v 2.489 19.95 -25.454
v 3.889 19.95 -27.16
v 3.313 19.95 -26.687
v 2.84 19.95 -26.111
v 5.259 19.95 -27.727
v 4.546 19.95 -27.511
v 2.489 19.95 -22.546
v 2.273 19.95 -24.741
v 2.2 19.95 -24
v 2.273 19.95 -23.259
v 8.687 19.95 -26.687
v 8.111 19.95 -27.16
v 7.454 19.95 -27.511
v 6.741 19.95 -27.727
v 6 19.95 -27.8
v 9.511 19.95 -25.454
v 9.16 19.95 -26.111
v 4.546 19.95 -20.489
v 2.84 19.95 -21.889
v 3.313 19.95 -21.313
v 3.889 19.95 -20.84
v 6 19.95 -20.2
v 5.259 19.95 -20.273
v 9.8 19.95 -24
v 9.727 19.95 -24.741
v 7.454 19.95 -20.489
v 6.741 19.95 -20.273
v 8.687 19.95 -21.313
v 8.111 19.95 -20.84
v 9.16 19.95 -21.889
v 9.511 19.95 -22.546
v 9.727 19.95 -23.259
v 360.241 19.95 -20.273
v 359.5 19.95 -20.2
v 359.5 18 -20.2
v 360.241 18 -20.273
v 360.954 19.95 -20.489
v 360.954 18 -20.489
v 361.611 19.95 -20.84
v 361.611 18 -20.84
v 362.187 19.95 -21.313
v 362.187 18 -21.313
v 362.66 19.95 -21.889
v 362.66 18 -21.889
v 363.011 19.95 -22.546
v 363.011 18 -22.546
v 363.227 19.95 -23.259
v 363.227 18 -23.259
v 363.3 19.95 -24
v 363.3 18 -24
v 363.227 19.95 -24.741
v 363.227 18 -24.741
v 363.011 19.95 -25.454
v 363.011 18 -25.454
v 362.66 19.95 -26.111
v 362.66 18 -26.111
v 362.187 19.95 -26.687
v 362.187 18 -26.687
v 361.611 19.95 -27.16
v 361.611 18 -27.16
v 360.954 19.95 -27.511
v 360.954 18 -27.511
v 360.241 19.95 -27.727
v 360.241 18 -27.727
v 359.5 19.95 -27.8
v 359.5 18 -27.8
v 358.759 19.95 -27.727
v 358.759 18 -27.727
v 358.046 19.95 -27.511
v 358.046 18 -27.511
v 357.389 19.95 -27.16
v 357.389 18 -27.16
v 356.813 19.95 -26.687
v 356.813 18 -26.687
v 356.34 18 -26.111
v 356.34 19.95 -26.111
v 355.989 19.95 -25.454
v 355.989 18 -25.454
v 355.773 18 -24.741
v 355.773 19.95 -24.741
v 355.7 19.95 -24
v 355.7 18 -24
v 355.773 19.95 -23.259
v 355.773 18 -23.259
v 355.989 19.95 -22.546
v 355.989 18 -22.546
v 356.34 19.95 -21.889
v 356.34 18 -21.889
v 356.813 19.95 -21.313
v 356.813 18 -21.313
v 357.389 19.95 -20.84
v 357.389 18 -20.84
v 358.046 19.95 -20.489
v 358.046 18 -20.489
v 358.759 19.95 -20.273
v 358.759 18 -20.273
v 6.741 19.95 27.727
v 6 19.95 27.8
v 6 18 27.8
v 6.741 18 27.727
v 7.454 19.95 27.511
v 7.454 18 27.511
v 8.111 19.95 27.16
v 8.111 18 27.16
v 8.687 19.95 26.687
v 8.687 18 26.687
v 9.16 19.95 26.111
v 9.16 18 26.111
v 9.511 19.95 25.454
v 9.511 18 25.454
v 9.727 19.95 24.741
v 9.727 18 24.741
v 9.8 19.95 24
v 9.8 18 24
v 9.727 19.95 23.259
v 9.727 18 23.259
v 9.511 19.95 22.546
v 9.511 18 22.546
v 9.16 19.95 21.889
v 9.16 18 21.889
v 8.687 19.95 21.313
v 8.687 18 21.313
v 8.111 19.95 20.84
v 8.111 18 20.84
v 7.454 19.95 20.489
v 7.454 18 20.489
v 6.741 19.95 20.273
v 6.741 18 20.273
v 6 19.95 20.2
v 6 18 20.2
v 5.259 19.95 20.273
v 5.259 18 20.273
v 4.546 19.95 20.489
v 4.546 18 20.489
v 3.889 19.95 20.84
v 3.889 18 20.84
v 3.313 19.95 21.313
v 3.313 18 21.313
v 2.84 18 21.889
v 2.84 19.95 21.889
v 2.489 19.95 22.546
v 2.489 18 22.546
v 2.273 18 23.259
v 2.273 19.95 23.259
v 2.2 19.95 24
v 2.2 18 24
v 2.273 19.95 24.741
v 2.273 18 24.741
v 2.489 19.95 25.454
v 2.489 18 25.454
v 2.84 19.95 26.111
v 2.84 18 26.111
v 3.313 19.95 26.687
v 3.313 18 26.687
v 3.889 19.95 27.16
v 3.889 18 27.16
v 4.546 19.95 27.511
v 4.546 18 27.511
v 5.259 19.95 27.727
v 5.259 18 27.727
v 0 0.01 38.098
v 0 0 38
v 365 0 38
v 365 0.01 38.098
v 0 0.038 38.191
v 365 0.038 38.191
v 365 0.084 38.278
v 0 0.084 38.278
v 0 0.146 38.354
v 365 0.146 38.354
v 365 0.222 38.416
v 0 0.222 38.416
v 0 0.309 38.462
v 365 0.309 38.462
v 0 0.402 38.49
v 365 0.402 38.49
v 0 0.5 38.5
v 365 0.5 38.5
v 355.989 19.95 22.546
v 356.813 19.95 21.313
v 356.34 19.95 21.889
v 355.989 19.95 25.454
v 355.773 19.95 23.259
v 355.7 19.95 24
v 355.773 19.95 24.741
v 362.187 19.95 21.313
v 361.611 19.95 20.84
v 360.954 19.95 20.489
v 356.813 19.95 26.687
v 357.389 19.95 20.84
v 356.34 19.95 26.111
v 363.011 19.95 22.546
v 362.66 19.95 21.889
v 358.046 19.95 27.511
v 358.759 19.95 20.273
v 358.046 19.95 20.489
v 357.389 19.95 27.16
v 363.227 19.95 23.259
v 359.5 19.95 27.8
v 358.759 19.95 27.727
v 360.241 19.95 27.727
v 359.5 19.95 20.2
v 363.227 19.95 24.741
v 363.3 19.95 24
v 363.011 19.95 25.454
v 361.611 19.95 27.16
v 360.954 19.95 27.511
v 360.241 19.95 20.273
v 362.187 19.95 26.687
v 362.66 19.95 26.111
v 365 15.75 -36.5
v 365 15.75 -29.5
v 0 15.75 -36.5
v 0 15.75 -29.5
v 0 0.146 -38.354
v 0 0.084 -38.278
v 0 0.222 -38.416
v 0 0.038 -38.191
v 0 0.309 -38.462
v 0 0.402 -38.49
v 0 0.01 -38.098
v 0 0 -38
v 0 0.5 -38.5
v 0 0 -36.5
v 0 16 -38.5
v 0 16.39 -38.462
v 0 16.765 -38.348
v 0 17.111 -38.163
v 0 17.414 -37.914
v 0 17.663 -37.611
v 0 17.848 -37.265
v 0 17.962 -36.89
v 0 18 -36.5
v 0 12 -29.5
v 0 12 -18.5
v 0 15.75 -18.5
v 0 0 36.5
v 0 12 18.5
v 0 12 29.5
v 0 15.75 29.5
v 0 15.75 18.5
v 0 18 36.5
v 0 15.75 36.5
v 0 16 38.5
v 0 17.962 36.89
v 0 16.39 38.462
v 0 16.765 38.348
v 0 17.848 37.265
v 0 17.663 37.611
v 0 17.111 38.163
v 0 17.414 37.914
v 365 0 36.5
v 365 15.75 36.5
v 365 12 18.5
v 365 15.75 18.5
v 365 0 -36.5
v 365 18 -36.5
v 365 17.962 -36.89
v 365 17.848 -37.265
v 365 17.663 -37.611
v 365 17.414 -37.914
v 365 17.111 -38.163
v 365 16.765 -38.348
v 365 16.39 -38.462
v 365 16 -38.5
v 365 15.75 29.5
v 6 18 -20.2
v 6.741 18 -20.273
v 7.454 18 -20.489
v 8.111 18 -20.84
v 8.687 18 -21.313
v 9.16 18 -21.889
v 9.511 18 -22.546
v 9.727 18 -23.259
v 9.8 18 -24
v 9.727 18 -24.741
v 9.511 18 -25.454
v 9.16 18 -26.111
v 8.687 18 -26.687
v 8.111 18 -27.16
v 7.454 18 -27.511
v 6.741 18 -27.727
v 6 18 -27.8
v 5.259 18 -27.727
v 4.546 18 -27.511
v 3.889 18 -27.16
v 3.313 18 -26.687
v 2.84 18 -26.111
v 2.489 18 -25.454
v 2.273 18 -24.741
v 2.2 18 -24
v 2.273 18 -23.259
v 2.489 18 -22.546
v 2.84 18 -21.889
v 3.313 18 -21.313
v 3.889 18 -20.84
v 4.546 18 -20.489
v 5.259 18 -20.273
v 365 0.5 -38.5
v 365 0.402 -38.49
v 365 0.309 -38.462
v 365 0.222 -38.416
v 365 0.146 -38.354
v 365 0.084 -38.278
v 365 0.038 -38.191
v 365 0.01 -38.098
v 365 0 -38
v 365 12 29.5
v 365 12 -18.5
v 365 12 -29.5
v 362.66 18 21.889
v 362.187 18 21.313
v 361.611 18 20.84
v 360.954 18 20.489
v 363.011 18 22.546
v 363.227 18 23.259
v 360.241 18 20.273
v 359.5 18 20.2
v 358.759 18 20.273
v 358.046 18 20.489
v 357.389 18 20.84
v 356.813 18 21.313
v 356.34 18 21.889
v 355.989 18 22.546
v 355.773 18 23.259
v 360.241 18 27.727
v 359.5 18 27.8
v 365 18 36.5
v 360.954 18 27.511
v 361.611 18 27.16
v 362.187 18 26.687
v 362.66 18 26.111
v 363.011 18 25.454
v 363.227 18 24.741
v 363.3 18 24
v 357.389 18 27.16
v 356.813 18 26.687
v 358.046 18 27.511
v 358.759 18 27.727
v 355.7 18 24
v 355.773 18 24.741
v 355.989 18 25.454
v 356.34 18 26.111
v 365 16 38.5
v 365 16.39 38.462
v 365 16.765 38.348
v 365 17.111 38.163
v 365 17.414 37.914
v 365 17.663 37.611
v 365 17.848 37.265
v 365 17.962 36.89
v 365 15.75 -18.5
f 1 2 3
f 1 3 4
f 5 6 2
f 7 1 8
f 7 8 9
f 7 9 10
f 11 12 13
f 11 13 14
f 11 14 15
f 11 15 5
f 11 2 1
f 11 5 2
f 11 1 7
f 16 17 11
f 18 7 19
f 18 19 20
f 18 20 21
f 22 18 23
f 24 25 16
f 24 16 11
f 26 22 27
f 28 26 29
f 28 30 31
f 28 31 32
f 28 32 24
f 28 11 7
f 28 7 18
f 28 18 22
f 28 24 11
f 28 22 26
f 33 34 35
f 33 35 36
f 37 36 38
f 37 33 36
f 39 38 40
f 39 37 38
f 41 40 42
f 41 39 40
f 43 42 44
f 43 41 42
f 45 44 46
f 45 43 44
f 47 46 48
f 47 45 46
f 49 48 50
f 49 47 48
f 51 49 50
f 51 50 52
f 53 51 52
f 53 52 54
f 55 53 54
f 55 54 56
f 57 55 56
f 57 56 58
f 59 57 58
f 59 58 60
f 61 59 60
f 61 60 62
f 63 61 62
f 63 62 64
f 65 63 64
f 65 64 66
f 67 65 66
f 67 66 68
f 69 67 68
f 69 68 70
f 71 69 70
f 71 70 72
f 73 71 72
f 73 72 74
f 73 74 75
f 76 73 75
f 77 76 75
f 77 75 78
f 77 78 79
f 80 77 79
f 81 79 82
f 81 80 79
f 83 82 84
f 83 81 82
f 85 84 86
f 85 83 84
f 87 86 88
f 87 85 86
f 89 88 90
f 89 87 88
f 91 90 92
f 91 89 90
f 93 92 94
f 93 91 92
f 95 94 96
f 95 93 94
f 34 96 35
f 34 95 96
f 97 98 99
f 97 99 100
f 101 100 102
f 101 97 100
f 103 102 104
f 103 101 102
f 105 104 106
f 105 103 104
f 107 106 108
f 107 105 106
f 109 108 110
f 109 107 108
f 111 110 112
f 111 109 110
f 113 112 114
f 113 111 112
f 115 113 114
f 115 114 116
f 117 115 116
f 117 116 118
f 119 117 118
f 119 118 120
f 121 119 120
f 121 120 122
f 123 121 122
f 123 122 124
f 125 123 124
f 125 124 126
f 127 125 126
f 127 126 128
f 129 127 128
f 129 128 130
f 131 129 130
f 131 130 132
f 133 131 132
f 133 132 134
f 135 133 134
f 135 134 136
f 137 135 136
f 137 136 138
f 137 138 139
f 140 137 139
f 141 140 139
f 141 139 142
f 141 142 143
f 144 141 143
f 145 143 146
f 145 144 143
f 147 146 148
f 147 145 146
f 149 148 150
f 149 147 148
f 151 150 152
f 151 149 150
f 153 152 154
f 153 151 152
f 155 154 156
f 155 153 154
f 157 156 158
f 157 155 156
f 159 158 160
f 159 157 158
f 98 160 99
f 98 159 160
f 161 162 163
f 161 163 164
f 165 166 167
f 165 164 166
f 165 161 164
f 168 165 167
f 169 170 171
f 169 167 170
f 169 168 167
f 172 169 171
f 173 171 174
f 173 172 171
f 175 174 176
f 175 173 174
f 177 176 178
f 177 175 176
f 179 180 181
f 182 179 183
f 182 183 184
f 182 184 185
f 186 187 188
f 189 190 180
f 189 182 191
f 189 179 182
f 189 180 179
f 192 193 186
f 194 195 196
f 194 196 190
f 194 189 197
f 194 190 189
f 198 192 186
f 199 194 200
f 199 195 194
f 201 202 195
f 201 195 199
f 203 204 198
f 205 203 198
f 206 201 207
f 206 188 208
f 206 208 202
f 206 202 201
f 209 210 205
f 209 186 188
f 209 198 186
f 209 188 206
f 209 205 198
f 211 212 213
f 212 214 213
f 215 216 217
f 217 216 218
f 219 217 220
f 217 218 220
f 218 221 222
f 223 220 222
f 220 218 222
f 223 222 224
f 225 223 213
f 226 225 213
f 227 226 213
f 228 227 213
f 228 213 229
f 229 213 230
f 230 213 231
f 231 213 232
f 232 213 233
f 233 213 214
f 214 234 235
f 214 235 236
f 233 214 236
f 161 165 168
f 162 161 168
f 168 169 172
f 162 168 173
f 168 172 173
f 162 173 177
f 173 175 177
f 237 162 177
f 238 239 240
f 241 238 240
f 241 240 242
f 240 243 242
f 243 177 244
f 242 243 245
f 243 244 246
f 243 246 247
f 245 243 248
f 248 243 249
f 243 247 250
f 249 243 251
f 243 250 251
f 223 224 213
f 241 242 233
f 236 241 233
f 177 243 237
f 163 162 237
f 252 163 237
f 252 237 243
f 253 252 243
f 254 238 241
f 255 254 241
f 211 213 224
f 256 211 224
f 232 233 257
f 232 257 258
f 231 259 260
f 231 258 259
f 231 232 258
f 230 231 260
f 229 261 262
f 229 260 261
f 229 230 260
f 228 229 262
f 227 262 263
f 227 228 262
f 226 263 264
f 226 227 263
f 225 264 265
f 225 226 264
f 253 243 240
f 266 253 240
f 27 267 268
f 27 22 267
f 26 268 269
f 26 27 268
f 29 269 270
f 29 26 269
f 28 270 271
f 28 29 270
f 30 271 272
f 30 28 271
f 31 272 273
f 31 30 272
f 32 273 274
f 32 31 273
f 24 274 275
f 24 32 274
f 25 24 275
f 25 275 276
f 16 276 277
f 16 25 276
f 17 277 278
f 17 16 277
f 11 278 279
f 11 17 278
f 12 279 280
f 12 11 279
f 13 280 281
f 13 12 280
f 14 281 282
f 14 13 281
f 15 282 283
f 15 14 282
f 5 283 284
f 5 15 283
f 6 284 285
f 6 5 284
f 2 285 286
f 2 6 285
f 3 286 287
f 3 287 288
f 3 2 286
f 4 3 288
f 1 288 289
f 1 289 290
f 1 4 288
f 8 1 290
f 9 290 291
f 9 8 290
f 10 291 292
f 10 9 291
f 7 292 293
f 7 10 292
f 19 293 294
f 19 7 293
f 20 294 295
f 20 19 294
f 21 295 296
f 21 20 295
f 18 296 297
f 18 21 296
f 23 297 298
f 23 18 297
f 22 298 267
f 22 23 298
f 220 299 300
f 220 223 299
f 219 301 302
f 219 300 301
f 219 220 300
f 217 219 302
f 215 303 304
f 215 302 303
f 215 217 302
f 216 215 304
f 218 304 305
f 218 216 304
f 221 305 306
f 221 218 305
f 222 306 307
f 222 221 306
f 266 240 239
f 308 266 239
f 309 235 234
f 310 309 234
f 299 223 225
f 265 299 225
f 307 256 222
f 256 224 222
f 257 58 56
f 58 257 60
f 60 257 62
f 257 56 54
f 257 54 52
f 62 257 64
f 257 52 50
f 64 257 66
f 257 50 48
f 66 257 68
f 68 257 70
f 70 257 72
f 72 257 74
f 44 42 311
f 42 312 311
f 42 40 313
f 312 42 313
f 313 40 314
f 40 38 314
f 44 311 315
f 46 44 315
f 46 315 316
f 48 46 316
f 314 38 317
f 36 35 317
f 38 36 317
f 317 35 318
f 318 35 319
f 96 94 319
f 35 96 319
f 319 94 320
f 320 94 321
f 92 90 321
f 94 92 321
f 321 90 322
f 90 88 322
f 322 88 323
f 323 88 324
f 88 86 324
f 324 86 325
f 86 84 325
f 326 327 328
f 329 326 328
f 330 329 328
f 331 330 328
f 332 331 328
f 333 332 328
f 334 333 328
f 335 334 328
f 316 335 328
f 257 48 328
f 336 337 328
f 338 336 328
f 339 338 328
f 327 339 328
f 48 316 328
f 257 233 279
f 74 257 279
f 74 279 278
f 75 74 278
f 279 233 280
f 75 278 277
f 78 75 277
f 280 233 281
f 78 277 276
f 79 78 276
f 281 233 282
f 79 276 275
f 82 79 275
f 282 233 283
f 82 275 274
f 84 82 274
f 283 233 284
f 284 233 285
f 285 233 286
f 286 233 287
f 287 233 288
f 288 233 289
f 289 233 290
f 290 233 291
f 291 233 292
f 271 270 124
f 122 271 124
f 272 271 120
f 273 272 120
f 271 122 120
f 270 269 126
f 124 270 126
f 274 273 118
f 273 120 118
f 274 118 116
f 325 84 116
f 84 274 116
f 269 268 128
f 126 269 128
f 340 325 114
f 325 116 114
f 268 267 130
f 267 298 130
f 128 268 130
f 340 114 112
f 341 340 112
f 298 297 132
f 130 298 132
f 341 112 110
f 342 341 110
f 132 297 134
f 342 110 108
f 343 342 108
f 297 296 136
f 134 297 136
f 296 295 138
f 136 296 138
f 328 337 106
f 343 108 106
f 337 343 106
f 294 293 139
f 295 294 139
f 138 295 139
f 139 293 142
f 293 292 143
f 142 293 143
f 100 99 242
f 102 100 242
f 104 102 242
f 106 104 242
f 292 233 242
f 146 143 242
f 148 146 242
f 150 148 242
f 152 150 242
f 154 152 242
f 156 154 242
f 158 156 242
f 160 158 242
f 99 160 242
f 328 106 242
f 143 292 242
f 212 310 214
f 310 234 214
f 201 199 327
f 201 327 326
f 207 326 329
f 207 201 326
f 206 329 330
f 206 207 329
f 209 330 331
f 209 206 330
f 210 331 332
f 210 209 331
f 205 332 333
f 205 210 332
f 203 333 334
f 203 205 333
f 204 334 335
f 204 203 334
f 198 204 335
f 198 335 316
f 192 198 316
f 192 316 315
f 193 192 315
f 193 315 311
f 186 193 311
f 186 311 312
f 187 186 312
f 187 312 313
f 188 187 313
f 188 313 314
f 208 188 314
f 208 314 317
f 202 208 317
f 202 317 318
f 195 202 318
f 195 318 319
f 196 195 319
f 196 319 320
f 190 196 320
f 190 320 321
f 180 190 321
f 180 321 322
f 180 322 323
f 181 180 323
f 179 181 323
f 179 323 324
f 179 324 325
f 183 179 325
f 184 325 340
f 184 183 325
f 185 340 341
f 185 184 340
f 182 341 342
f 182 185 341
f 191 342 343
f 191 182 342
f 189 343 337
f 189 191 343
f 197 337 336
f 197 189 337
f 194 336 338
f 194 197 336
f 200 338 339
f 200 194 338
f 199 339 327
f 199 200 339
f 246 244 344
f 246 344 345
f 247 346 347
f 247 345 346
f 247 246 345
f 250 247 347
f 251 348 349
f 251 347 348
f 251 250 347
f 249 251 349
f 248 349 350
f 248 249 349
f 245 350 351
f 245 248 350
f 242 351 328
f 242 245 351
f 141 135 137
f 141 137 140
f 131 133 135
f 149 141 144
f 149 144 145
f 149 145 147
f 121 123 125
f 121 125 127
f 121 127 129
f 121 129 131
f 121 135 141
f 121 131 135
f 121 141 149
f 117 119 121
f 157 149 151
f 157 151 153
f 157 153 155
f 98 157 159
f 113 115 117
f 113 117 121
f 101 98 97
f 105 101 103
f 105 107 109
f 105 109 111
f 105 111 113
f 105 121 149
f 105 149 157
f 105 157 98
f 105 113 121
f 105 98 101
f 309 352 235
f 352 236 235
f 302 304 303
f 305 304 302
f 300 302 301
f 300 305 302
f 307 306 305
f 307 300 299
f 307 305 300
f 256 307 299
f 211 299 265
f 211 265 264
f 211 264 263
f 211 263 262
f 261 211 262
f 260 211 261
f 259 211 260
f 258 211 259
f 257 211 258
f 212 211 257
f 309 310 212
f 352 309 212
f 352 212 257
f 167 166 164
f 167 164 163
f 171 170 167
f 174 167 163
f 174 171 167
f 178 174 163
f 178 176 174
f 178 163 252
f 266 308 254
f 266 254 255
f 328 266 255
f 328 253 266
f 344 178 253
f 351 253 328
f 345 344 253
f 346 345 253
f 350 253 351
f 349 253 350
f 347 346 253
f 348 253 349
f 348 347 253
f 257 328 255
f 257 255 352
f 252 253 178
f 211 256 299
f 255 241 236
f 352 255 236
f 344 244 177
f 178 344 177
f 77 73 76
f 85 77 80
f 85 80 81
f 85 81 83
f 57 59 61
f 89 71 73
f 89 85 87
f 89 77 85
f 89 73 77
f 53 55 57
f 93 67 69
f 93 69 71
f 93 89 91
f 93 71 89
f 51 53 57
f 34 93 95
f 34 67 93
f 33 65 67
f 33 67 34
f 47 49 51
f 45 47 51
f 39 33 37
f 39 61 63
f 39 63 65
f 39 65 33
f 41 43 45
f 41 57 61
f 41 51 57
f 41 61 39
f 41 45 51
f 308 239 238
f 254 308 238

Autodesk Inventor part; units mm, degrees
sketch "Sketch_1" plane through (0, 0, 0) normal (1, 0, 0) x (0, 1, 0)
  line L0 (16, 38.5) -> (0.5, 38.5)
  arc A0 (0.5, 38.5) -> (0, 38) centre (0.5, 38) ccw
  line L1 (0, 38) -> (0, 36.5)
  line L2 (0, 36.5) -> (15.75, 36.5)
  line L3 (15.75, 36.5) -> (15.75, 29.5)
  line L4 (15.75, 29.5) -> (12, 29.5)
  line L5 (12, 29.5) -> (12, 18.5)
  line L6 (12, 18.5) -> (15.75, 18.5)
  line L7 (15.75, 18.5) -> (15.75, -18.5)
  line L8 (15.75, -18.5) -> (12, -18.5)
  line L9 (12, -18.5) -> (12, -29.5)
  line L10 (12, -29.5) -> (15.75, -29.5)
  line L11 (15.75, -29.5) -> (15.75, -36.5)
  line L12 (15.75, -36.5) -> (0, -36.5)
  line L13 (0, -36.5) -> (0, -38)
  arc A1 (0, -38) -> (0.5, -38.5) centre (0.5, -38) ccw
  line L14 (0.5, -38.5) -> (16, -38.5)
  arc A2 (16, -38.5) -> (18, -36.5) centre (16, -36.5) ccw
  line L15 (18, -36.5) -> (18, 36.5)
  arc A3 (18, 36.5) -> (16, 38.5) centre (16, 36.5) ccw
extrude "Extrusion1" add sketch "Sketch_1" along normal blind 365
sketch "Sketch_3" plane through (6, 0, 0) normal (1, 0, 0) x (0, 0, -1)
  line L0 (-24, 19.95) -> (-24, 18)
  line L1 (-24, 18) -> (-27.8, 18)
  line L2 (-27.8, 18) -> (-27.8, 19.95)
  line L3 (-27.8, 19.95) -> (-24, 19.95)
  line L4 (-24, 19.95) -> (-24, 18)
revolve "Revolution1" add sketch "Sketch_3" angle 360 about axis through (6, 19.95, 24) along (0, 1, 0)
pattern_linear "Rectangular Pattern1" count 2 spacing 353.5 along (1, 0, 0) count 2 spacing 48 along (0, 0, -1) of "Revolution1"
ref_plane "pc_body_XY" through (6, 12, 0) normal (1, 0, 0) x (0, 0, -1)
ref_plane "pc_body_YZ" through (6, 12, 0) normal (0, 0, -1) x (0, 1, 0)
ref_plane "pc_body_ZX" through (6, 12, 0) normal (0, 1, 0) x (1, 0, 0)
properties part number "KR45H-340-Protected Cover"
